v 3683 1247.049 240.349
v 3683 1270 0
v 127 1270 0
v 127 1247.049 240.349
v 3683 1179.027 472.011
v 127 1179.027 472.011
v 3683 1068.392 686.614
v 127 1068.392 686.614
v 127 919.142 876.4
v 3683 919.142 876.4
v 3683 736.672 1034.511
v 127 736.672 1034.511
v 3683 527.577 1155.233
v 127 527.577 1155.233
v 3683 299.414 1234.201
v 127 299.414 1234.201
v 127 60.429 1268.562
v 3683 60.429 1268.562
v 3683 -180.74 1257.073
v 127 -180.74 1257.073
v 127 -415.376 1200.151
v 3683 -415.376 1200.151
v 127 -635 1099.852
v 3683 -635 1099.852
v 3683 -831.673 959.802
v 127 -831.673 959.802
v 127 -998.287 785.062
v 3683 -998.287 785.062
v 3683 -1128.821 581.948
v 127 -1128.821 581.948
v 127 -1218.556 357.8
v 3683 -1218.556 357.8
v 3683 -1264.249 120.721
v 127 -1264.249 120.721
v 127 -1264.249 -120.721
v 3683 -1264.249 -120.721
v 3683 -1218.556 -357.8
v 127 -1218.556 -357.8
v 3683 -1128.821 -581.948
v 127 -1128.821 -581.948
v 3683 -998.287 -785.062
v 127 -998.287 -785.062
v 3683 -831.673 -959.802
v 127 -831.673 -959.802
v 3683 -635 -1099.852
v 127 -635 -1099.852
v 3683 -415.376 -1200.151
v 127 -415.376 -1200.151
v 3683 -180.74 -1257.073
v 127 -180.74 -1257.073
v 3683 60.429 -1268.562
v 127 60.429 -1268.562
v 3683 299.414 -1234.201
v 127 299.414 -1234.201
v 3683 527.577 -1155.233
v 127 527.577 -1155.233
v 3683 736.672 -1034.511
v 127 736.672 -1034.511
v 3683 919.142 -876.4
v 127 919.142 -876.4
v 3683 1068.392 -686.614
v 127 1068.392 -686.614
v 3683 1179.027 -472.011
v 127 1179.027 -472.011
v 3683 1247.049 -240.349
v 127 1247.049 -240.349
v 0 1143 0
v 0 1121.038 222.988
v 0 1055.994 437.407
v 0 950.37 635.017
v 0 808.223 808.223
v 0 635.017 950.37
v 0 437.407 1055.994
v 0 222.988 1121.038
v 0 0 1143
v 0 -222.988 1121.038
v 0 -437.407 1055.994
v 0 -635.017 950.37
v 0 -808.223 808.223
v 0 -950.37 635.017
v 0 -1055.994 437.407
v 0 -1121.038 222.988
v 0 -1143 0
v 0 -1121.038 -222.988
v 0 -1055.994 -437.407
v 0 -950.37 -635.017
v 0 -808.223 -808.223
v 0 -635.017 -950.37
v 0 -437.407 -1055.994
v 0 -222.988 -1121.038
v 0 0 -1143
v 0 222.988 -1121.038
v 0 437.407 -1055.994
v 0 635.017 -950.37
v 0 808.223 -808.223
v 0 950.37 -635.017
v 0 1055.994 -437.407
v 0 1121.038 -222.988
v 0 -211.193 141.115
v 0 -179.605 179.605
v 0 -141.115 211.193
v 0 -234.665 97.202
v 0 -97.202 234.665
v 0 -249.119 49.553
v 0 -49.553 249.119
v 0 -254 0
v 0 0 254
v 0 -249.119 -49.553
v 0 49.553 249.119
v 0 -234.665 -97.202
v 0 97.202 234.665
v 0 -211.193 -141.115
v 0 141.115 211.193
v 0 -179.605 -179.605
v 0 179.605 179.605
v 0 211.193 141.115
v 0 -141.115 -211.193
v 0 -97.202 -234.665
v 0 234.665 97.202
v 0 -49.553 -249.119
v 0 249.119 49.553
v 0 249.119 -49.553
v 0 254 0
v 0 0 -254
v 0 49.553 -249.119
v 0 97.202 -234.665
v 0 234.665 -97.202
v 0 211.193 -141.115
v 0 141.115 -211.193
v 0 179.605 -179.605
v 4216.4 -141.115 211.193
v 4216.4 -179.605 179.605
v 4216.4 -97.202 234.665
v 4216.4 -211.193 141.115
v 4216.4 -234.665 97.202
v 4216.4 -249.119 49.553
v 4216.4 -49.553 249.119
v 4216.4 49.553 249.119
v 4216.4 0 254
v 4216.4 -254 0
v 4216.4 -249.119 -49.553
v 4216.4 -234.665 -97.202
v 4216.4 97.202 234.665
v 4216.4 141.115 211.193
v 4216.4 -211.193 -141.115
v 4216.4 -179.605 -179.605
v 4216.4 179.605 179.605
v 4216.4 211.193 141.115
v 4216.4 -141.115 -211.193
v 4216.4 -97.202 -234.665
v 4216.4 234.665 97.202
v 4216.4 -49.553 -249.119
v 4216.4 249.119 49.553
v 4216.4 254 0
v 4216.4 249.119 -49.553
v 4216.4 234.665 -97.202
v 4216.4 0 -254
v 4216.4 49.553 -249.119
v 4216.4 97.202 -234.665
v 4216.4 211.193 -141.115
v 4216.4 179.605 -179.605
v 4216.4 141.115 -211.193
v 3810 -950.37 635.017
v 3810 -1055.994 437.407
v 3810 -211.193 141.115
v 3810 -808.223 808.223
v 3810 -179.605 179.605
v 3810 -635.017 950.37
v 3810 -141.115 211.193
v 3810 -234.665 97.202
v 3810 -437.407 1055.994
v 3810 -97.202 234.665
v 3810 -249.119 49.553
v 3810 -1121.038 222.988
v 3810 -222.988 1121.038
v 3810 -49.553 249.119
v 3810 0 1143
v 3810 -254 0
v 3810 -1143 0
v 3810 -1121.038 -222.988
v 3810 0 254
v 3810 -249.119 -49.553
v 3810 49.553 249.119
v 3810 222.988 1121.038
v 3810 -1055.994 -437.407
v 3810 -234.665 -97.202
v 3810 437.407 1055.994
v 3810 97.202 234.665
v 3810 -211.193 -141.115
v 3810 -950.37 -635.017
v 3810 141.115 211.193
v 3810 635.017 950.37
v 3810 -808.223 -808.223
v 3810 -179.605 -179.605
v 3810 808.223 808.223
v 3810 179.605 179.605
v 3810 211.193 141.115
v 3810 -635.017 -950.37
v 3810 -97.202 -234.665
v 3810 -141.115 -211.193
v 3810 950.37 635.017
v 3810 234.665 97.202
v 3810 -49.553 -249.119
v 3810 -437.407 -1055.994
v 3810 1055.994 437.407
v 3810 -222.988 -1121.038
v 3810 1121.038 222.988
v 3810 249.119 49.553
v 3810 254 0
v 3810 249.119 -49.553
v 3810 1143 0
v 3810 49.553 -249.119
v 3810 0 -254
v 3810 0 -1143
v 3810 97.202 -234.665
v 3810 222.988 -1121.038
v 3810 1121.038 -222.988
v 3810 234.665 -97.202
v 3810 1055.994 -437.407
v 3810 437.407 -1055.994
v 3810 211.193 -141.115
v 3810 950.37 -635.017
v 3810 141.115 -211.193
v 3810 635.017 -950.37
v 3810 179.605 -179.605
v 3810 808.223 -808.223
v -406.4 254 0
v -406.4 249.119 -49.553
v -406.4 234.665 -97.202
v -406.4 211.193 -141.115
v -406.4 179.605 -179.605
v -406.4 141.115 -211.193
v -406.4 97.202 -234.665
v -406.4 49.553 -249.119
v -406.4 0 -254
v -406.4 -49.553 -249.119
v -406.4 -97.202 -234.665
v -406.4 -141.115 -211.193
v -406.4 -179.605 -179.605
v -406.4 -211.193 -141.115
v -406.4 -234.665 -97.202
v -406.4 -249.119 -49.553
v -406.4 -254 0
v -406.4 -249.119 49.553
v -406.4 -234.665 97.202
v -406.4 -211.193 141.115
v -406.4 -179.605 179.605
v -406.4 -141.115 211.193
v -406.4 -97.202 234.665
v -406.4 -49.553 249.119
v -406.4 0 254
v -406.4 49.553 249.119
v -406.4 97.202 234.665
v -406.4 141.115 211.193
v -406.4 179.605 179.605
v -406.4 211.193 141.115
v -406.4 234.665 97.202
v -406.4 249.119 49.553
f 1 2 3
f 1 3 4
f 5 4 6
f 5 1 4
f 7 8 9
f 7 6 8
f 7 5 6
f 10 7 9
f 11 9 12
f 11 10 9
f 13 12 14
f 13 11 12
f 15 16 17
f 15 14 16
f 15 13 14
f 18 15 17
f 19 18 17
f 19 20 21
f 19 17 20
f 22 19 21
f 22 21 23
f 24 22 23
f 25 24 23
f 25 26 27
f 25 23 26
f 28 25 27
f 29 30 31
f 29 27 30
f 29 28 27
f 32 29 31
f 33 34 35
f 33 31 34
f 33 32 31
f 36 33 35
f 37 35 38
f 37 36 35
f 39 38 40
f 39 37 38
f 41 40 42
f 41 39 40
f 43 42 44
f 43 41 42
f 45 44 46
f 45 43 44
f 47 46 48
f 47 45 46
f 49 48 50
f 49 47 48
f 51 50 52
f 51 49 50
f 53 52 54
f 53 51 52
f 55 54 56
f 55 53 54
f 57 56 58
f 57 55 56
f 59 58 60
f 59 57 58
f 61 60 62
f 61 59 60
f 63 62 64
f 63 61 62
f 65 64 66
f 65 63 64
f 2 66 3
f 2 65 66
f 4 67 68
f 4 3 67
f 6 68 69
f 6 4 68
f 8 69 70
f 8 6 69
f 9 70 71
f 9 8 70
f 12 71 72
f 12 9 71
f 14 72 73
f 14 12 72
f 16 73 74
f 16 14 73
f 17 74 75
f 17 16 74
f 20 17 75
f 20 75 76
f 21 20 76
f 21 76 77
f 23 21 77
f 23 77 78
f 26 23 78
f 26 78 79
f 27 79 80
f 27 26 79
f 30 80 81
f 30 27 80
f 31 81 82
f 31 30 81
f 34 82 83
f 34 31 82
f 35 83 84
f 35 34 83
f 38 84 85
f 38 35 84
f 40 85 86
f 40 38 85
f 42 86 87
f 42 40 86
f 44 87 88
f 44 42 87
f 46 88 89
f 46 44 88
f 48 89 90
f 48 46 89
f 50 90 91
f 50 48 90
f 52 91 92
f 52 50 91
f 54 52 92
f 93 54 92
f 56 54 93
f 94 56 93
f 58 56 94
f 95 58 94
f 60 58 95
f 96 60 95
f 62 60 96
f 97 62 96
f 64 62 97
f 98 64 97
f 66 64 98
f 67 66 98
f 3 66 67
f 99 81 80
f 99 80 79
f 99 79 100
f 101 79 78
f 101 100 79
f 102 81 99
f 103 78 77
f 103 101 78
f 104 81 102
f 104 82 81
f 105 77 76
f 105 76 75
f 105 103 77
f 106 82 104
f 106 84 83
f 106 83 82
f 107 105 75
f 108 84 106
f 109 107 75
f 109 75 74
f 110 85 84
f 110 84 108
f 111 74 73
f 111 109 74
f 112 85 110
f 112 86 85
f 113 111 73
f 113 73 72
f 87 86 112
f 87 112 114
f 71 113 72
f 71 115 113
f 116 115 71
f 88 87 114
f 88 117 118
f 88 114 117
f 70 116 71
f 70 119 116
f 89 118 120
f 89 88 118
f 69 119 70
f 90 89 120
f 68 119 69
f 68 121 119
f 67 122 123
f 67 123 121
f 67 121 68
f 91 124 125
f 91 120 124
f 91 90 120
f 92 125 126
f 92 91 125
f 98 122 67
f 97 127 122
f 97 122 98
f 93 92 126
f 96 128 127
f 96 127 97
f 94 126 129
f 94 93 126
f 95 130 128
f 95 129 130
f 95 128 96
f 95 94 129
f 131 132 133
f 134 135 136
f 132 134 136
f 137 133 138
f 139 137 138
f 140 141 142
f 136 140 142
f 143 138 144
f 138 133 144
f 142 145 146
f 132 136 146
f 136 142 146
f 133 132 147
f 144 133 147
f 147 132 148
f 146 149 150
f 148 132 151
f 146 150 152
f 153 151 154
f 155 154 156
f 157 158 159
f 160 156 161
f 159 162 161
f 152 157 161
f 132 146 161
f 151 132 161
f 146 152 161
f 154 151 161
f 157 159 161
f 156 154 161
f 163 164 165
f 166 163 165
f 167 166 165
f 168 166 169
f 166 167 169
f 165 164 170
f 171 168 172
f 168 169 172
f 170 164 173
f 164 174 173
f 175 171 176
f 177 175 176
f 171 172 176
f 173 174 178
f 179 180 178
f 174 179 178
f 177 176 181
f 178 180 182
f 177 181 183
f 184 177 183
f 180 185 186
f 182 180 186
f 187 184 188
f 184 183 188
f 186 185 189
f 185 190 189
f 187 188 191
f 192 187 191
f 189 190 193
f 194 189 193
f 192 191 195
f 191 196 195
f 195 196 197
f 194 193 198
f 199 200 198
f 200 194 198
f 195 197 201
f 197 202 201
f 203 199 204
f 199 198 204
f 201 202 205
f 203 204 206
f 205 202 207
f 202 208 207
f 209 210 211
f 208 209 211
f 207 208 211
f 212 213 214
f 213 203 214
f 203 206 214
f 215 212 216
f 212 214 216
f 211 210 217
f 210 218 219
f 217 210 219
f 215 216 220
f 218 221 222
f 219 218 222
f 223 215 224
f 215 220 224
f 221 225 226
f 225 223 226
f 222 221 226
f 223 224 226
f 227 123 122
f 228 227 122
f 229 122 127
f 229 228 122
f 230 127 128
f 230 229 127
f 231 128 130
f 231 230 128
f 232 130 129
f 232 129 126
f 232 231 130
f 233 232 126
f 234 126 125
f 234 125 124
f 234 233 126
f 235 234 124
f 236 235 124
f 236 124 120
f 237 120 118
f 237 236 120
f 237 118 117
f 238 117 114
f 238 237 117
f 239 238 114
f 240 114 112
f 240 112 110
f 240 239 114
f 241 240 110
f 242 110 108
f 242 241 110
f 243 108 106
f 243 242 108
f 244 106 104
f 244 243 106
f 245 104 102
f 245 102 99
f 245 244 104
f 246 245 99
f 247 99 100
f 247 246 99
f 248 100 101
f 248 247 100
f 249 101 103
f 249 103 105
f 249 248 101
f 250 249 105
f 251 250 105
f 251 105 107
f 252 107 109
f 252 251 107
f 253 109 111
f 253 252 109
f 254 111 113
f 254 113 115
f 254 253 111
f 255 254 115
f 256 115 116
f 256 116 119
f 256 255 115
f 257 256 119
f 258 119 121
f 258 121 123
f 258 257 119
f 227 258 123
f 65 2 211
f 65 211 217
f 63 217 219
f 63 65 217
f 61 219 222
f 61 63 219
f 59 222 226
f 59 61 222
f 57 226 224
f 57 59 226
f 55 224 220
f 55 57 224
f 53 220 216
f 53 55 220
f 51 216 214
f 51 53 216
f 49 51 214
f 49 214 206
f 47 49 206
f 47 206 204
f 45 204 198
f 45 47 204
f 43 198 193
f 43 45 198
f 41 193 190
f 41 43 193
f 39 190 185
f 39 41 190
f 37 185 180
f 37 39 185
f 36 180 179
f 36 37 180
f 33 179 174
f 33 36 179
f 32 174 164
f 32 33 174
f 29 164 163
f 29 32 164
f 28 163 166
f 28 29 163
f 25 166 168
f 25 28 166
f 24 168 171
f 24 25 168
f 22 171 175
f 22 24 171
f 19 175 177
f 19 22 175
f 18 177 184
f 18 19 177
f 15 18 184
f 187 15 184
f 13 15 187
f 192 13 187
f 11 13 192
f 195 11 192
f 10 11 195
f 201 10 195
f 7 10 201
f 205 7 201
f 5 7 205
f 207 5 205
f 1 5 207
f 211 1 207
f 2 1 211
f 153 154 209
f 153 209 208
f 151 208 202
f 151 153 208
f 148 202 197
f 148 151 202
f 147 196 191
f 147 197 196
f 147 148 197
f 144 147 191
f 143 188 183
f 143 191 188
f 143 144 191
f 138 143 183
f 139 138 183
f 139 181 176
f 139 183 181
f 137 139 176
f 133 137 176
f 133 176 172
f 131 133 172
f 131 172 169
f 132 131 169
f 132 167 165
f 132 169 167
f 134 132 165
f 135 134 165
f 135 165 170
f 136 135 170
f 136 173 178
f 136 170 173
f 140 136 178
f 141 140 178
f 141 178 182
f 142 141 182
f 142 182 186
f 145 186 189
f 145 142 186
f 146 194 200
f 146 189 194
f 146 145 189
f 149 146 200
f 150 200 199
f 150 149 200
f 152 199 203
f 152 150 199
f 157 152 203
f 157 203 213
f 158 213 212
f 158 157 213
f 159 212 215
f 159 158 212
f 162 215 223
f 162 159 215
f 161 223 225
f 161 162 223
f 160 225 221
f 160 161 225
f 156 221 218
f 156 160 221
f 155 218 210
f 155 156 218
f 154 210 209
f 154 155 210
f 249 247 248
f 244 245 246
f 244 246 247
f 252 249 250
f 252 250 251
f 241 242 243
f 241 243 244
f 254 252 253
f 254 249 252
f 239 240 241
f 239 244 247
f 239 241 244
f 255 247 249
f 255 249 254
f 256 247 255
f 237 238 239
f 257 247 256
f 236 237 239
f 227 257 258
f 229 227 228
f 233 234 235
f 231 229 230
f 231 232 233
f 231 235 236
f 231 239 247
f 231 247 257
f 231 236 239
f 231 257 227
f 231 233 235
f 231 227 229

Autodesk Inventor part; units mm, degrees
ref_plane "YZ Plane" through (0, 0, 0) normal (1, 0, 0) x (0, 1, 0)
ref_plane "XZ Plane" through (0, 0, 0) normal (0, 1, 0) x (-1, 0, 0)
ref_plane "XY Plane" through (0, 0, 0) normal (0, 0, 1) x (1, 0, 0)
sketch "草圖1" plane through (0, 0, 0) normal (0, 0, 1) x (1, 0, 0)
  line L0 (0, 0) -> (0, 1143)
  line L1 (127, 1270) -> (3683, 1270)
  line L2 (3810, 1143) -> (3810, 0)
  line L3 (3810, 0) -> (0, 0)
  line L4 (3810, 0) -> (3810, 254)
  line L5 (3810, 254) -> (4216.4, 254)
  line L6 (4216.4, 254) -> (4216.4, 0)
  line L7 (4216.4, 0) -> (3810, 0)
  line L8 (0, 0) -> (0, 254)
  line L9 (0, 254) -> (-406.4, 254)
  line L10 (-406.4, 254) -> (-406.4, 0)
  line L11 (-406.4, 0) -> (0, 0)
  line L12 (3.175, 1270) -> (0, 1266.825)
  line L13 (127, 1270) -> (0, 1143)
  line L14 (3683, 1270) -> (3810, 1143)
  point P0 (0, 1270)
  point P1 (3810, 1270)
  point P2 (0, 1270)
  dimension "d0" = 1270
  dimension "d1" = 3810
  dimension "d2" = 254
  dimension "d3" = 406.4
  dimension "d4" = 406.4
  dimension "d5" = 3.175
  dimension "d6" = 3.175
  dimension "d7" = 127
  dimension "d8" = 127
  dimension "d9" = 127
  dimension "d10" = 127
revolve "迴轉1" add sketch "草圖1" angle 360 about axis through (3810, 0, 0) along (-1, 0, 0)
equation "\"d6\" = d5"
equation "\"d8\" = d7"
equation "\"d9\" = d7"
equation "\"d10\" = d9"
